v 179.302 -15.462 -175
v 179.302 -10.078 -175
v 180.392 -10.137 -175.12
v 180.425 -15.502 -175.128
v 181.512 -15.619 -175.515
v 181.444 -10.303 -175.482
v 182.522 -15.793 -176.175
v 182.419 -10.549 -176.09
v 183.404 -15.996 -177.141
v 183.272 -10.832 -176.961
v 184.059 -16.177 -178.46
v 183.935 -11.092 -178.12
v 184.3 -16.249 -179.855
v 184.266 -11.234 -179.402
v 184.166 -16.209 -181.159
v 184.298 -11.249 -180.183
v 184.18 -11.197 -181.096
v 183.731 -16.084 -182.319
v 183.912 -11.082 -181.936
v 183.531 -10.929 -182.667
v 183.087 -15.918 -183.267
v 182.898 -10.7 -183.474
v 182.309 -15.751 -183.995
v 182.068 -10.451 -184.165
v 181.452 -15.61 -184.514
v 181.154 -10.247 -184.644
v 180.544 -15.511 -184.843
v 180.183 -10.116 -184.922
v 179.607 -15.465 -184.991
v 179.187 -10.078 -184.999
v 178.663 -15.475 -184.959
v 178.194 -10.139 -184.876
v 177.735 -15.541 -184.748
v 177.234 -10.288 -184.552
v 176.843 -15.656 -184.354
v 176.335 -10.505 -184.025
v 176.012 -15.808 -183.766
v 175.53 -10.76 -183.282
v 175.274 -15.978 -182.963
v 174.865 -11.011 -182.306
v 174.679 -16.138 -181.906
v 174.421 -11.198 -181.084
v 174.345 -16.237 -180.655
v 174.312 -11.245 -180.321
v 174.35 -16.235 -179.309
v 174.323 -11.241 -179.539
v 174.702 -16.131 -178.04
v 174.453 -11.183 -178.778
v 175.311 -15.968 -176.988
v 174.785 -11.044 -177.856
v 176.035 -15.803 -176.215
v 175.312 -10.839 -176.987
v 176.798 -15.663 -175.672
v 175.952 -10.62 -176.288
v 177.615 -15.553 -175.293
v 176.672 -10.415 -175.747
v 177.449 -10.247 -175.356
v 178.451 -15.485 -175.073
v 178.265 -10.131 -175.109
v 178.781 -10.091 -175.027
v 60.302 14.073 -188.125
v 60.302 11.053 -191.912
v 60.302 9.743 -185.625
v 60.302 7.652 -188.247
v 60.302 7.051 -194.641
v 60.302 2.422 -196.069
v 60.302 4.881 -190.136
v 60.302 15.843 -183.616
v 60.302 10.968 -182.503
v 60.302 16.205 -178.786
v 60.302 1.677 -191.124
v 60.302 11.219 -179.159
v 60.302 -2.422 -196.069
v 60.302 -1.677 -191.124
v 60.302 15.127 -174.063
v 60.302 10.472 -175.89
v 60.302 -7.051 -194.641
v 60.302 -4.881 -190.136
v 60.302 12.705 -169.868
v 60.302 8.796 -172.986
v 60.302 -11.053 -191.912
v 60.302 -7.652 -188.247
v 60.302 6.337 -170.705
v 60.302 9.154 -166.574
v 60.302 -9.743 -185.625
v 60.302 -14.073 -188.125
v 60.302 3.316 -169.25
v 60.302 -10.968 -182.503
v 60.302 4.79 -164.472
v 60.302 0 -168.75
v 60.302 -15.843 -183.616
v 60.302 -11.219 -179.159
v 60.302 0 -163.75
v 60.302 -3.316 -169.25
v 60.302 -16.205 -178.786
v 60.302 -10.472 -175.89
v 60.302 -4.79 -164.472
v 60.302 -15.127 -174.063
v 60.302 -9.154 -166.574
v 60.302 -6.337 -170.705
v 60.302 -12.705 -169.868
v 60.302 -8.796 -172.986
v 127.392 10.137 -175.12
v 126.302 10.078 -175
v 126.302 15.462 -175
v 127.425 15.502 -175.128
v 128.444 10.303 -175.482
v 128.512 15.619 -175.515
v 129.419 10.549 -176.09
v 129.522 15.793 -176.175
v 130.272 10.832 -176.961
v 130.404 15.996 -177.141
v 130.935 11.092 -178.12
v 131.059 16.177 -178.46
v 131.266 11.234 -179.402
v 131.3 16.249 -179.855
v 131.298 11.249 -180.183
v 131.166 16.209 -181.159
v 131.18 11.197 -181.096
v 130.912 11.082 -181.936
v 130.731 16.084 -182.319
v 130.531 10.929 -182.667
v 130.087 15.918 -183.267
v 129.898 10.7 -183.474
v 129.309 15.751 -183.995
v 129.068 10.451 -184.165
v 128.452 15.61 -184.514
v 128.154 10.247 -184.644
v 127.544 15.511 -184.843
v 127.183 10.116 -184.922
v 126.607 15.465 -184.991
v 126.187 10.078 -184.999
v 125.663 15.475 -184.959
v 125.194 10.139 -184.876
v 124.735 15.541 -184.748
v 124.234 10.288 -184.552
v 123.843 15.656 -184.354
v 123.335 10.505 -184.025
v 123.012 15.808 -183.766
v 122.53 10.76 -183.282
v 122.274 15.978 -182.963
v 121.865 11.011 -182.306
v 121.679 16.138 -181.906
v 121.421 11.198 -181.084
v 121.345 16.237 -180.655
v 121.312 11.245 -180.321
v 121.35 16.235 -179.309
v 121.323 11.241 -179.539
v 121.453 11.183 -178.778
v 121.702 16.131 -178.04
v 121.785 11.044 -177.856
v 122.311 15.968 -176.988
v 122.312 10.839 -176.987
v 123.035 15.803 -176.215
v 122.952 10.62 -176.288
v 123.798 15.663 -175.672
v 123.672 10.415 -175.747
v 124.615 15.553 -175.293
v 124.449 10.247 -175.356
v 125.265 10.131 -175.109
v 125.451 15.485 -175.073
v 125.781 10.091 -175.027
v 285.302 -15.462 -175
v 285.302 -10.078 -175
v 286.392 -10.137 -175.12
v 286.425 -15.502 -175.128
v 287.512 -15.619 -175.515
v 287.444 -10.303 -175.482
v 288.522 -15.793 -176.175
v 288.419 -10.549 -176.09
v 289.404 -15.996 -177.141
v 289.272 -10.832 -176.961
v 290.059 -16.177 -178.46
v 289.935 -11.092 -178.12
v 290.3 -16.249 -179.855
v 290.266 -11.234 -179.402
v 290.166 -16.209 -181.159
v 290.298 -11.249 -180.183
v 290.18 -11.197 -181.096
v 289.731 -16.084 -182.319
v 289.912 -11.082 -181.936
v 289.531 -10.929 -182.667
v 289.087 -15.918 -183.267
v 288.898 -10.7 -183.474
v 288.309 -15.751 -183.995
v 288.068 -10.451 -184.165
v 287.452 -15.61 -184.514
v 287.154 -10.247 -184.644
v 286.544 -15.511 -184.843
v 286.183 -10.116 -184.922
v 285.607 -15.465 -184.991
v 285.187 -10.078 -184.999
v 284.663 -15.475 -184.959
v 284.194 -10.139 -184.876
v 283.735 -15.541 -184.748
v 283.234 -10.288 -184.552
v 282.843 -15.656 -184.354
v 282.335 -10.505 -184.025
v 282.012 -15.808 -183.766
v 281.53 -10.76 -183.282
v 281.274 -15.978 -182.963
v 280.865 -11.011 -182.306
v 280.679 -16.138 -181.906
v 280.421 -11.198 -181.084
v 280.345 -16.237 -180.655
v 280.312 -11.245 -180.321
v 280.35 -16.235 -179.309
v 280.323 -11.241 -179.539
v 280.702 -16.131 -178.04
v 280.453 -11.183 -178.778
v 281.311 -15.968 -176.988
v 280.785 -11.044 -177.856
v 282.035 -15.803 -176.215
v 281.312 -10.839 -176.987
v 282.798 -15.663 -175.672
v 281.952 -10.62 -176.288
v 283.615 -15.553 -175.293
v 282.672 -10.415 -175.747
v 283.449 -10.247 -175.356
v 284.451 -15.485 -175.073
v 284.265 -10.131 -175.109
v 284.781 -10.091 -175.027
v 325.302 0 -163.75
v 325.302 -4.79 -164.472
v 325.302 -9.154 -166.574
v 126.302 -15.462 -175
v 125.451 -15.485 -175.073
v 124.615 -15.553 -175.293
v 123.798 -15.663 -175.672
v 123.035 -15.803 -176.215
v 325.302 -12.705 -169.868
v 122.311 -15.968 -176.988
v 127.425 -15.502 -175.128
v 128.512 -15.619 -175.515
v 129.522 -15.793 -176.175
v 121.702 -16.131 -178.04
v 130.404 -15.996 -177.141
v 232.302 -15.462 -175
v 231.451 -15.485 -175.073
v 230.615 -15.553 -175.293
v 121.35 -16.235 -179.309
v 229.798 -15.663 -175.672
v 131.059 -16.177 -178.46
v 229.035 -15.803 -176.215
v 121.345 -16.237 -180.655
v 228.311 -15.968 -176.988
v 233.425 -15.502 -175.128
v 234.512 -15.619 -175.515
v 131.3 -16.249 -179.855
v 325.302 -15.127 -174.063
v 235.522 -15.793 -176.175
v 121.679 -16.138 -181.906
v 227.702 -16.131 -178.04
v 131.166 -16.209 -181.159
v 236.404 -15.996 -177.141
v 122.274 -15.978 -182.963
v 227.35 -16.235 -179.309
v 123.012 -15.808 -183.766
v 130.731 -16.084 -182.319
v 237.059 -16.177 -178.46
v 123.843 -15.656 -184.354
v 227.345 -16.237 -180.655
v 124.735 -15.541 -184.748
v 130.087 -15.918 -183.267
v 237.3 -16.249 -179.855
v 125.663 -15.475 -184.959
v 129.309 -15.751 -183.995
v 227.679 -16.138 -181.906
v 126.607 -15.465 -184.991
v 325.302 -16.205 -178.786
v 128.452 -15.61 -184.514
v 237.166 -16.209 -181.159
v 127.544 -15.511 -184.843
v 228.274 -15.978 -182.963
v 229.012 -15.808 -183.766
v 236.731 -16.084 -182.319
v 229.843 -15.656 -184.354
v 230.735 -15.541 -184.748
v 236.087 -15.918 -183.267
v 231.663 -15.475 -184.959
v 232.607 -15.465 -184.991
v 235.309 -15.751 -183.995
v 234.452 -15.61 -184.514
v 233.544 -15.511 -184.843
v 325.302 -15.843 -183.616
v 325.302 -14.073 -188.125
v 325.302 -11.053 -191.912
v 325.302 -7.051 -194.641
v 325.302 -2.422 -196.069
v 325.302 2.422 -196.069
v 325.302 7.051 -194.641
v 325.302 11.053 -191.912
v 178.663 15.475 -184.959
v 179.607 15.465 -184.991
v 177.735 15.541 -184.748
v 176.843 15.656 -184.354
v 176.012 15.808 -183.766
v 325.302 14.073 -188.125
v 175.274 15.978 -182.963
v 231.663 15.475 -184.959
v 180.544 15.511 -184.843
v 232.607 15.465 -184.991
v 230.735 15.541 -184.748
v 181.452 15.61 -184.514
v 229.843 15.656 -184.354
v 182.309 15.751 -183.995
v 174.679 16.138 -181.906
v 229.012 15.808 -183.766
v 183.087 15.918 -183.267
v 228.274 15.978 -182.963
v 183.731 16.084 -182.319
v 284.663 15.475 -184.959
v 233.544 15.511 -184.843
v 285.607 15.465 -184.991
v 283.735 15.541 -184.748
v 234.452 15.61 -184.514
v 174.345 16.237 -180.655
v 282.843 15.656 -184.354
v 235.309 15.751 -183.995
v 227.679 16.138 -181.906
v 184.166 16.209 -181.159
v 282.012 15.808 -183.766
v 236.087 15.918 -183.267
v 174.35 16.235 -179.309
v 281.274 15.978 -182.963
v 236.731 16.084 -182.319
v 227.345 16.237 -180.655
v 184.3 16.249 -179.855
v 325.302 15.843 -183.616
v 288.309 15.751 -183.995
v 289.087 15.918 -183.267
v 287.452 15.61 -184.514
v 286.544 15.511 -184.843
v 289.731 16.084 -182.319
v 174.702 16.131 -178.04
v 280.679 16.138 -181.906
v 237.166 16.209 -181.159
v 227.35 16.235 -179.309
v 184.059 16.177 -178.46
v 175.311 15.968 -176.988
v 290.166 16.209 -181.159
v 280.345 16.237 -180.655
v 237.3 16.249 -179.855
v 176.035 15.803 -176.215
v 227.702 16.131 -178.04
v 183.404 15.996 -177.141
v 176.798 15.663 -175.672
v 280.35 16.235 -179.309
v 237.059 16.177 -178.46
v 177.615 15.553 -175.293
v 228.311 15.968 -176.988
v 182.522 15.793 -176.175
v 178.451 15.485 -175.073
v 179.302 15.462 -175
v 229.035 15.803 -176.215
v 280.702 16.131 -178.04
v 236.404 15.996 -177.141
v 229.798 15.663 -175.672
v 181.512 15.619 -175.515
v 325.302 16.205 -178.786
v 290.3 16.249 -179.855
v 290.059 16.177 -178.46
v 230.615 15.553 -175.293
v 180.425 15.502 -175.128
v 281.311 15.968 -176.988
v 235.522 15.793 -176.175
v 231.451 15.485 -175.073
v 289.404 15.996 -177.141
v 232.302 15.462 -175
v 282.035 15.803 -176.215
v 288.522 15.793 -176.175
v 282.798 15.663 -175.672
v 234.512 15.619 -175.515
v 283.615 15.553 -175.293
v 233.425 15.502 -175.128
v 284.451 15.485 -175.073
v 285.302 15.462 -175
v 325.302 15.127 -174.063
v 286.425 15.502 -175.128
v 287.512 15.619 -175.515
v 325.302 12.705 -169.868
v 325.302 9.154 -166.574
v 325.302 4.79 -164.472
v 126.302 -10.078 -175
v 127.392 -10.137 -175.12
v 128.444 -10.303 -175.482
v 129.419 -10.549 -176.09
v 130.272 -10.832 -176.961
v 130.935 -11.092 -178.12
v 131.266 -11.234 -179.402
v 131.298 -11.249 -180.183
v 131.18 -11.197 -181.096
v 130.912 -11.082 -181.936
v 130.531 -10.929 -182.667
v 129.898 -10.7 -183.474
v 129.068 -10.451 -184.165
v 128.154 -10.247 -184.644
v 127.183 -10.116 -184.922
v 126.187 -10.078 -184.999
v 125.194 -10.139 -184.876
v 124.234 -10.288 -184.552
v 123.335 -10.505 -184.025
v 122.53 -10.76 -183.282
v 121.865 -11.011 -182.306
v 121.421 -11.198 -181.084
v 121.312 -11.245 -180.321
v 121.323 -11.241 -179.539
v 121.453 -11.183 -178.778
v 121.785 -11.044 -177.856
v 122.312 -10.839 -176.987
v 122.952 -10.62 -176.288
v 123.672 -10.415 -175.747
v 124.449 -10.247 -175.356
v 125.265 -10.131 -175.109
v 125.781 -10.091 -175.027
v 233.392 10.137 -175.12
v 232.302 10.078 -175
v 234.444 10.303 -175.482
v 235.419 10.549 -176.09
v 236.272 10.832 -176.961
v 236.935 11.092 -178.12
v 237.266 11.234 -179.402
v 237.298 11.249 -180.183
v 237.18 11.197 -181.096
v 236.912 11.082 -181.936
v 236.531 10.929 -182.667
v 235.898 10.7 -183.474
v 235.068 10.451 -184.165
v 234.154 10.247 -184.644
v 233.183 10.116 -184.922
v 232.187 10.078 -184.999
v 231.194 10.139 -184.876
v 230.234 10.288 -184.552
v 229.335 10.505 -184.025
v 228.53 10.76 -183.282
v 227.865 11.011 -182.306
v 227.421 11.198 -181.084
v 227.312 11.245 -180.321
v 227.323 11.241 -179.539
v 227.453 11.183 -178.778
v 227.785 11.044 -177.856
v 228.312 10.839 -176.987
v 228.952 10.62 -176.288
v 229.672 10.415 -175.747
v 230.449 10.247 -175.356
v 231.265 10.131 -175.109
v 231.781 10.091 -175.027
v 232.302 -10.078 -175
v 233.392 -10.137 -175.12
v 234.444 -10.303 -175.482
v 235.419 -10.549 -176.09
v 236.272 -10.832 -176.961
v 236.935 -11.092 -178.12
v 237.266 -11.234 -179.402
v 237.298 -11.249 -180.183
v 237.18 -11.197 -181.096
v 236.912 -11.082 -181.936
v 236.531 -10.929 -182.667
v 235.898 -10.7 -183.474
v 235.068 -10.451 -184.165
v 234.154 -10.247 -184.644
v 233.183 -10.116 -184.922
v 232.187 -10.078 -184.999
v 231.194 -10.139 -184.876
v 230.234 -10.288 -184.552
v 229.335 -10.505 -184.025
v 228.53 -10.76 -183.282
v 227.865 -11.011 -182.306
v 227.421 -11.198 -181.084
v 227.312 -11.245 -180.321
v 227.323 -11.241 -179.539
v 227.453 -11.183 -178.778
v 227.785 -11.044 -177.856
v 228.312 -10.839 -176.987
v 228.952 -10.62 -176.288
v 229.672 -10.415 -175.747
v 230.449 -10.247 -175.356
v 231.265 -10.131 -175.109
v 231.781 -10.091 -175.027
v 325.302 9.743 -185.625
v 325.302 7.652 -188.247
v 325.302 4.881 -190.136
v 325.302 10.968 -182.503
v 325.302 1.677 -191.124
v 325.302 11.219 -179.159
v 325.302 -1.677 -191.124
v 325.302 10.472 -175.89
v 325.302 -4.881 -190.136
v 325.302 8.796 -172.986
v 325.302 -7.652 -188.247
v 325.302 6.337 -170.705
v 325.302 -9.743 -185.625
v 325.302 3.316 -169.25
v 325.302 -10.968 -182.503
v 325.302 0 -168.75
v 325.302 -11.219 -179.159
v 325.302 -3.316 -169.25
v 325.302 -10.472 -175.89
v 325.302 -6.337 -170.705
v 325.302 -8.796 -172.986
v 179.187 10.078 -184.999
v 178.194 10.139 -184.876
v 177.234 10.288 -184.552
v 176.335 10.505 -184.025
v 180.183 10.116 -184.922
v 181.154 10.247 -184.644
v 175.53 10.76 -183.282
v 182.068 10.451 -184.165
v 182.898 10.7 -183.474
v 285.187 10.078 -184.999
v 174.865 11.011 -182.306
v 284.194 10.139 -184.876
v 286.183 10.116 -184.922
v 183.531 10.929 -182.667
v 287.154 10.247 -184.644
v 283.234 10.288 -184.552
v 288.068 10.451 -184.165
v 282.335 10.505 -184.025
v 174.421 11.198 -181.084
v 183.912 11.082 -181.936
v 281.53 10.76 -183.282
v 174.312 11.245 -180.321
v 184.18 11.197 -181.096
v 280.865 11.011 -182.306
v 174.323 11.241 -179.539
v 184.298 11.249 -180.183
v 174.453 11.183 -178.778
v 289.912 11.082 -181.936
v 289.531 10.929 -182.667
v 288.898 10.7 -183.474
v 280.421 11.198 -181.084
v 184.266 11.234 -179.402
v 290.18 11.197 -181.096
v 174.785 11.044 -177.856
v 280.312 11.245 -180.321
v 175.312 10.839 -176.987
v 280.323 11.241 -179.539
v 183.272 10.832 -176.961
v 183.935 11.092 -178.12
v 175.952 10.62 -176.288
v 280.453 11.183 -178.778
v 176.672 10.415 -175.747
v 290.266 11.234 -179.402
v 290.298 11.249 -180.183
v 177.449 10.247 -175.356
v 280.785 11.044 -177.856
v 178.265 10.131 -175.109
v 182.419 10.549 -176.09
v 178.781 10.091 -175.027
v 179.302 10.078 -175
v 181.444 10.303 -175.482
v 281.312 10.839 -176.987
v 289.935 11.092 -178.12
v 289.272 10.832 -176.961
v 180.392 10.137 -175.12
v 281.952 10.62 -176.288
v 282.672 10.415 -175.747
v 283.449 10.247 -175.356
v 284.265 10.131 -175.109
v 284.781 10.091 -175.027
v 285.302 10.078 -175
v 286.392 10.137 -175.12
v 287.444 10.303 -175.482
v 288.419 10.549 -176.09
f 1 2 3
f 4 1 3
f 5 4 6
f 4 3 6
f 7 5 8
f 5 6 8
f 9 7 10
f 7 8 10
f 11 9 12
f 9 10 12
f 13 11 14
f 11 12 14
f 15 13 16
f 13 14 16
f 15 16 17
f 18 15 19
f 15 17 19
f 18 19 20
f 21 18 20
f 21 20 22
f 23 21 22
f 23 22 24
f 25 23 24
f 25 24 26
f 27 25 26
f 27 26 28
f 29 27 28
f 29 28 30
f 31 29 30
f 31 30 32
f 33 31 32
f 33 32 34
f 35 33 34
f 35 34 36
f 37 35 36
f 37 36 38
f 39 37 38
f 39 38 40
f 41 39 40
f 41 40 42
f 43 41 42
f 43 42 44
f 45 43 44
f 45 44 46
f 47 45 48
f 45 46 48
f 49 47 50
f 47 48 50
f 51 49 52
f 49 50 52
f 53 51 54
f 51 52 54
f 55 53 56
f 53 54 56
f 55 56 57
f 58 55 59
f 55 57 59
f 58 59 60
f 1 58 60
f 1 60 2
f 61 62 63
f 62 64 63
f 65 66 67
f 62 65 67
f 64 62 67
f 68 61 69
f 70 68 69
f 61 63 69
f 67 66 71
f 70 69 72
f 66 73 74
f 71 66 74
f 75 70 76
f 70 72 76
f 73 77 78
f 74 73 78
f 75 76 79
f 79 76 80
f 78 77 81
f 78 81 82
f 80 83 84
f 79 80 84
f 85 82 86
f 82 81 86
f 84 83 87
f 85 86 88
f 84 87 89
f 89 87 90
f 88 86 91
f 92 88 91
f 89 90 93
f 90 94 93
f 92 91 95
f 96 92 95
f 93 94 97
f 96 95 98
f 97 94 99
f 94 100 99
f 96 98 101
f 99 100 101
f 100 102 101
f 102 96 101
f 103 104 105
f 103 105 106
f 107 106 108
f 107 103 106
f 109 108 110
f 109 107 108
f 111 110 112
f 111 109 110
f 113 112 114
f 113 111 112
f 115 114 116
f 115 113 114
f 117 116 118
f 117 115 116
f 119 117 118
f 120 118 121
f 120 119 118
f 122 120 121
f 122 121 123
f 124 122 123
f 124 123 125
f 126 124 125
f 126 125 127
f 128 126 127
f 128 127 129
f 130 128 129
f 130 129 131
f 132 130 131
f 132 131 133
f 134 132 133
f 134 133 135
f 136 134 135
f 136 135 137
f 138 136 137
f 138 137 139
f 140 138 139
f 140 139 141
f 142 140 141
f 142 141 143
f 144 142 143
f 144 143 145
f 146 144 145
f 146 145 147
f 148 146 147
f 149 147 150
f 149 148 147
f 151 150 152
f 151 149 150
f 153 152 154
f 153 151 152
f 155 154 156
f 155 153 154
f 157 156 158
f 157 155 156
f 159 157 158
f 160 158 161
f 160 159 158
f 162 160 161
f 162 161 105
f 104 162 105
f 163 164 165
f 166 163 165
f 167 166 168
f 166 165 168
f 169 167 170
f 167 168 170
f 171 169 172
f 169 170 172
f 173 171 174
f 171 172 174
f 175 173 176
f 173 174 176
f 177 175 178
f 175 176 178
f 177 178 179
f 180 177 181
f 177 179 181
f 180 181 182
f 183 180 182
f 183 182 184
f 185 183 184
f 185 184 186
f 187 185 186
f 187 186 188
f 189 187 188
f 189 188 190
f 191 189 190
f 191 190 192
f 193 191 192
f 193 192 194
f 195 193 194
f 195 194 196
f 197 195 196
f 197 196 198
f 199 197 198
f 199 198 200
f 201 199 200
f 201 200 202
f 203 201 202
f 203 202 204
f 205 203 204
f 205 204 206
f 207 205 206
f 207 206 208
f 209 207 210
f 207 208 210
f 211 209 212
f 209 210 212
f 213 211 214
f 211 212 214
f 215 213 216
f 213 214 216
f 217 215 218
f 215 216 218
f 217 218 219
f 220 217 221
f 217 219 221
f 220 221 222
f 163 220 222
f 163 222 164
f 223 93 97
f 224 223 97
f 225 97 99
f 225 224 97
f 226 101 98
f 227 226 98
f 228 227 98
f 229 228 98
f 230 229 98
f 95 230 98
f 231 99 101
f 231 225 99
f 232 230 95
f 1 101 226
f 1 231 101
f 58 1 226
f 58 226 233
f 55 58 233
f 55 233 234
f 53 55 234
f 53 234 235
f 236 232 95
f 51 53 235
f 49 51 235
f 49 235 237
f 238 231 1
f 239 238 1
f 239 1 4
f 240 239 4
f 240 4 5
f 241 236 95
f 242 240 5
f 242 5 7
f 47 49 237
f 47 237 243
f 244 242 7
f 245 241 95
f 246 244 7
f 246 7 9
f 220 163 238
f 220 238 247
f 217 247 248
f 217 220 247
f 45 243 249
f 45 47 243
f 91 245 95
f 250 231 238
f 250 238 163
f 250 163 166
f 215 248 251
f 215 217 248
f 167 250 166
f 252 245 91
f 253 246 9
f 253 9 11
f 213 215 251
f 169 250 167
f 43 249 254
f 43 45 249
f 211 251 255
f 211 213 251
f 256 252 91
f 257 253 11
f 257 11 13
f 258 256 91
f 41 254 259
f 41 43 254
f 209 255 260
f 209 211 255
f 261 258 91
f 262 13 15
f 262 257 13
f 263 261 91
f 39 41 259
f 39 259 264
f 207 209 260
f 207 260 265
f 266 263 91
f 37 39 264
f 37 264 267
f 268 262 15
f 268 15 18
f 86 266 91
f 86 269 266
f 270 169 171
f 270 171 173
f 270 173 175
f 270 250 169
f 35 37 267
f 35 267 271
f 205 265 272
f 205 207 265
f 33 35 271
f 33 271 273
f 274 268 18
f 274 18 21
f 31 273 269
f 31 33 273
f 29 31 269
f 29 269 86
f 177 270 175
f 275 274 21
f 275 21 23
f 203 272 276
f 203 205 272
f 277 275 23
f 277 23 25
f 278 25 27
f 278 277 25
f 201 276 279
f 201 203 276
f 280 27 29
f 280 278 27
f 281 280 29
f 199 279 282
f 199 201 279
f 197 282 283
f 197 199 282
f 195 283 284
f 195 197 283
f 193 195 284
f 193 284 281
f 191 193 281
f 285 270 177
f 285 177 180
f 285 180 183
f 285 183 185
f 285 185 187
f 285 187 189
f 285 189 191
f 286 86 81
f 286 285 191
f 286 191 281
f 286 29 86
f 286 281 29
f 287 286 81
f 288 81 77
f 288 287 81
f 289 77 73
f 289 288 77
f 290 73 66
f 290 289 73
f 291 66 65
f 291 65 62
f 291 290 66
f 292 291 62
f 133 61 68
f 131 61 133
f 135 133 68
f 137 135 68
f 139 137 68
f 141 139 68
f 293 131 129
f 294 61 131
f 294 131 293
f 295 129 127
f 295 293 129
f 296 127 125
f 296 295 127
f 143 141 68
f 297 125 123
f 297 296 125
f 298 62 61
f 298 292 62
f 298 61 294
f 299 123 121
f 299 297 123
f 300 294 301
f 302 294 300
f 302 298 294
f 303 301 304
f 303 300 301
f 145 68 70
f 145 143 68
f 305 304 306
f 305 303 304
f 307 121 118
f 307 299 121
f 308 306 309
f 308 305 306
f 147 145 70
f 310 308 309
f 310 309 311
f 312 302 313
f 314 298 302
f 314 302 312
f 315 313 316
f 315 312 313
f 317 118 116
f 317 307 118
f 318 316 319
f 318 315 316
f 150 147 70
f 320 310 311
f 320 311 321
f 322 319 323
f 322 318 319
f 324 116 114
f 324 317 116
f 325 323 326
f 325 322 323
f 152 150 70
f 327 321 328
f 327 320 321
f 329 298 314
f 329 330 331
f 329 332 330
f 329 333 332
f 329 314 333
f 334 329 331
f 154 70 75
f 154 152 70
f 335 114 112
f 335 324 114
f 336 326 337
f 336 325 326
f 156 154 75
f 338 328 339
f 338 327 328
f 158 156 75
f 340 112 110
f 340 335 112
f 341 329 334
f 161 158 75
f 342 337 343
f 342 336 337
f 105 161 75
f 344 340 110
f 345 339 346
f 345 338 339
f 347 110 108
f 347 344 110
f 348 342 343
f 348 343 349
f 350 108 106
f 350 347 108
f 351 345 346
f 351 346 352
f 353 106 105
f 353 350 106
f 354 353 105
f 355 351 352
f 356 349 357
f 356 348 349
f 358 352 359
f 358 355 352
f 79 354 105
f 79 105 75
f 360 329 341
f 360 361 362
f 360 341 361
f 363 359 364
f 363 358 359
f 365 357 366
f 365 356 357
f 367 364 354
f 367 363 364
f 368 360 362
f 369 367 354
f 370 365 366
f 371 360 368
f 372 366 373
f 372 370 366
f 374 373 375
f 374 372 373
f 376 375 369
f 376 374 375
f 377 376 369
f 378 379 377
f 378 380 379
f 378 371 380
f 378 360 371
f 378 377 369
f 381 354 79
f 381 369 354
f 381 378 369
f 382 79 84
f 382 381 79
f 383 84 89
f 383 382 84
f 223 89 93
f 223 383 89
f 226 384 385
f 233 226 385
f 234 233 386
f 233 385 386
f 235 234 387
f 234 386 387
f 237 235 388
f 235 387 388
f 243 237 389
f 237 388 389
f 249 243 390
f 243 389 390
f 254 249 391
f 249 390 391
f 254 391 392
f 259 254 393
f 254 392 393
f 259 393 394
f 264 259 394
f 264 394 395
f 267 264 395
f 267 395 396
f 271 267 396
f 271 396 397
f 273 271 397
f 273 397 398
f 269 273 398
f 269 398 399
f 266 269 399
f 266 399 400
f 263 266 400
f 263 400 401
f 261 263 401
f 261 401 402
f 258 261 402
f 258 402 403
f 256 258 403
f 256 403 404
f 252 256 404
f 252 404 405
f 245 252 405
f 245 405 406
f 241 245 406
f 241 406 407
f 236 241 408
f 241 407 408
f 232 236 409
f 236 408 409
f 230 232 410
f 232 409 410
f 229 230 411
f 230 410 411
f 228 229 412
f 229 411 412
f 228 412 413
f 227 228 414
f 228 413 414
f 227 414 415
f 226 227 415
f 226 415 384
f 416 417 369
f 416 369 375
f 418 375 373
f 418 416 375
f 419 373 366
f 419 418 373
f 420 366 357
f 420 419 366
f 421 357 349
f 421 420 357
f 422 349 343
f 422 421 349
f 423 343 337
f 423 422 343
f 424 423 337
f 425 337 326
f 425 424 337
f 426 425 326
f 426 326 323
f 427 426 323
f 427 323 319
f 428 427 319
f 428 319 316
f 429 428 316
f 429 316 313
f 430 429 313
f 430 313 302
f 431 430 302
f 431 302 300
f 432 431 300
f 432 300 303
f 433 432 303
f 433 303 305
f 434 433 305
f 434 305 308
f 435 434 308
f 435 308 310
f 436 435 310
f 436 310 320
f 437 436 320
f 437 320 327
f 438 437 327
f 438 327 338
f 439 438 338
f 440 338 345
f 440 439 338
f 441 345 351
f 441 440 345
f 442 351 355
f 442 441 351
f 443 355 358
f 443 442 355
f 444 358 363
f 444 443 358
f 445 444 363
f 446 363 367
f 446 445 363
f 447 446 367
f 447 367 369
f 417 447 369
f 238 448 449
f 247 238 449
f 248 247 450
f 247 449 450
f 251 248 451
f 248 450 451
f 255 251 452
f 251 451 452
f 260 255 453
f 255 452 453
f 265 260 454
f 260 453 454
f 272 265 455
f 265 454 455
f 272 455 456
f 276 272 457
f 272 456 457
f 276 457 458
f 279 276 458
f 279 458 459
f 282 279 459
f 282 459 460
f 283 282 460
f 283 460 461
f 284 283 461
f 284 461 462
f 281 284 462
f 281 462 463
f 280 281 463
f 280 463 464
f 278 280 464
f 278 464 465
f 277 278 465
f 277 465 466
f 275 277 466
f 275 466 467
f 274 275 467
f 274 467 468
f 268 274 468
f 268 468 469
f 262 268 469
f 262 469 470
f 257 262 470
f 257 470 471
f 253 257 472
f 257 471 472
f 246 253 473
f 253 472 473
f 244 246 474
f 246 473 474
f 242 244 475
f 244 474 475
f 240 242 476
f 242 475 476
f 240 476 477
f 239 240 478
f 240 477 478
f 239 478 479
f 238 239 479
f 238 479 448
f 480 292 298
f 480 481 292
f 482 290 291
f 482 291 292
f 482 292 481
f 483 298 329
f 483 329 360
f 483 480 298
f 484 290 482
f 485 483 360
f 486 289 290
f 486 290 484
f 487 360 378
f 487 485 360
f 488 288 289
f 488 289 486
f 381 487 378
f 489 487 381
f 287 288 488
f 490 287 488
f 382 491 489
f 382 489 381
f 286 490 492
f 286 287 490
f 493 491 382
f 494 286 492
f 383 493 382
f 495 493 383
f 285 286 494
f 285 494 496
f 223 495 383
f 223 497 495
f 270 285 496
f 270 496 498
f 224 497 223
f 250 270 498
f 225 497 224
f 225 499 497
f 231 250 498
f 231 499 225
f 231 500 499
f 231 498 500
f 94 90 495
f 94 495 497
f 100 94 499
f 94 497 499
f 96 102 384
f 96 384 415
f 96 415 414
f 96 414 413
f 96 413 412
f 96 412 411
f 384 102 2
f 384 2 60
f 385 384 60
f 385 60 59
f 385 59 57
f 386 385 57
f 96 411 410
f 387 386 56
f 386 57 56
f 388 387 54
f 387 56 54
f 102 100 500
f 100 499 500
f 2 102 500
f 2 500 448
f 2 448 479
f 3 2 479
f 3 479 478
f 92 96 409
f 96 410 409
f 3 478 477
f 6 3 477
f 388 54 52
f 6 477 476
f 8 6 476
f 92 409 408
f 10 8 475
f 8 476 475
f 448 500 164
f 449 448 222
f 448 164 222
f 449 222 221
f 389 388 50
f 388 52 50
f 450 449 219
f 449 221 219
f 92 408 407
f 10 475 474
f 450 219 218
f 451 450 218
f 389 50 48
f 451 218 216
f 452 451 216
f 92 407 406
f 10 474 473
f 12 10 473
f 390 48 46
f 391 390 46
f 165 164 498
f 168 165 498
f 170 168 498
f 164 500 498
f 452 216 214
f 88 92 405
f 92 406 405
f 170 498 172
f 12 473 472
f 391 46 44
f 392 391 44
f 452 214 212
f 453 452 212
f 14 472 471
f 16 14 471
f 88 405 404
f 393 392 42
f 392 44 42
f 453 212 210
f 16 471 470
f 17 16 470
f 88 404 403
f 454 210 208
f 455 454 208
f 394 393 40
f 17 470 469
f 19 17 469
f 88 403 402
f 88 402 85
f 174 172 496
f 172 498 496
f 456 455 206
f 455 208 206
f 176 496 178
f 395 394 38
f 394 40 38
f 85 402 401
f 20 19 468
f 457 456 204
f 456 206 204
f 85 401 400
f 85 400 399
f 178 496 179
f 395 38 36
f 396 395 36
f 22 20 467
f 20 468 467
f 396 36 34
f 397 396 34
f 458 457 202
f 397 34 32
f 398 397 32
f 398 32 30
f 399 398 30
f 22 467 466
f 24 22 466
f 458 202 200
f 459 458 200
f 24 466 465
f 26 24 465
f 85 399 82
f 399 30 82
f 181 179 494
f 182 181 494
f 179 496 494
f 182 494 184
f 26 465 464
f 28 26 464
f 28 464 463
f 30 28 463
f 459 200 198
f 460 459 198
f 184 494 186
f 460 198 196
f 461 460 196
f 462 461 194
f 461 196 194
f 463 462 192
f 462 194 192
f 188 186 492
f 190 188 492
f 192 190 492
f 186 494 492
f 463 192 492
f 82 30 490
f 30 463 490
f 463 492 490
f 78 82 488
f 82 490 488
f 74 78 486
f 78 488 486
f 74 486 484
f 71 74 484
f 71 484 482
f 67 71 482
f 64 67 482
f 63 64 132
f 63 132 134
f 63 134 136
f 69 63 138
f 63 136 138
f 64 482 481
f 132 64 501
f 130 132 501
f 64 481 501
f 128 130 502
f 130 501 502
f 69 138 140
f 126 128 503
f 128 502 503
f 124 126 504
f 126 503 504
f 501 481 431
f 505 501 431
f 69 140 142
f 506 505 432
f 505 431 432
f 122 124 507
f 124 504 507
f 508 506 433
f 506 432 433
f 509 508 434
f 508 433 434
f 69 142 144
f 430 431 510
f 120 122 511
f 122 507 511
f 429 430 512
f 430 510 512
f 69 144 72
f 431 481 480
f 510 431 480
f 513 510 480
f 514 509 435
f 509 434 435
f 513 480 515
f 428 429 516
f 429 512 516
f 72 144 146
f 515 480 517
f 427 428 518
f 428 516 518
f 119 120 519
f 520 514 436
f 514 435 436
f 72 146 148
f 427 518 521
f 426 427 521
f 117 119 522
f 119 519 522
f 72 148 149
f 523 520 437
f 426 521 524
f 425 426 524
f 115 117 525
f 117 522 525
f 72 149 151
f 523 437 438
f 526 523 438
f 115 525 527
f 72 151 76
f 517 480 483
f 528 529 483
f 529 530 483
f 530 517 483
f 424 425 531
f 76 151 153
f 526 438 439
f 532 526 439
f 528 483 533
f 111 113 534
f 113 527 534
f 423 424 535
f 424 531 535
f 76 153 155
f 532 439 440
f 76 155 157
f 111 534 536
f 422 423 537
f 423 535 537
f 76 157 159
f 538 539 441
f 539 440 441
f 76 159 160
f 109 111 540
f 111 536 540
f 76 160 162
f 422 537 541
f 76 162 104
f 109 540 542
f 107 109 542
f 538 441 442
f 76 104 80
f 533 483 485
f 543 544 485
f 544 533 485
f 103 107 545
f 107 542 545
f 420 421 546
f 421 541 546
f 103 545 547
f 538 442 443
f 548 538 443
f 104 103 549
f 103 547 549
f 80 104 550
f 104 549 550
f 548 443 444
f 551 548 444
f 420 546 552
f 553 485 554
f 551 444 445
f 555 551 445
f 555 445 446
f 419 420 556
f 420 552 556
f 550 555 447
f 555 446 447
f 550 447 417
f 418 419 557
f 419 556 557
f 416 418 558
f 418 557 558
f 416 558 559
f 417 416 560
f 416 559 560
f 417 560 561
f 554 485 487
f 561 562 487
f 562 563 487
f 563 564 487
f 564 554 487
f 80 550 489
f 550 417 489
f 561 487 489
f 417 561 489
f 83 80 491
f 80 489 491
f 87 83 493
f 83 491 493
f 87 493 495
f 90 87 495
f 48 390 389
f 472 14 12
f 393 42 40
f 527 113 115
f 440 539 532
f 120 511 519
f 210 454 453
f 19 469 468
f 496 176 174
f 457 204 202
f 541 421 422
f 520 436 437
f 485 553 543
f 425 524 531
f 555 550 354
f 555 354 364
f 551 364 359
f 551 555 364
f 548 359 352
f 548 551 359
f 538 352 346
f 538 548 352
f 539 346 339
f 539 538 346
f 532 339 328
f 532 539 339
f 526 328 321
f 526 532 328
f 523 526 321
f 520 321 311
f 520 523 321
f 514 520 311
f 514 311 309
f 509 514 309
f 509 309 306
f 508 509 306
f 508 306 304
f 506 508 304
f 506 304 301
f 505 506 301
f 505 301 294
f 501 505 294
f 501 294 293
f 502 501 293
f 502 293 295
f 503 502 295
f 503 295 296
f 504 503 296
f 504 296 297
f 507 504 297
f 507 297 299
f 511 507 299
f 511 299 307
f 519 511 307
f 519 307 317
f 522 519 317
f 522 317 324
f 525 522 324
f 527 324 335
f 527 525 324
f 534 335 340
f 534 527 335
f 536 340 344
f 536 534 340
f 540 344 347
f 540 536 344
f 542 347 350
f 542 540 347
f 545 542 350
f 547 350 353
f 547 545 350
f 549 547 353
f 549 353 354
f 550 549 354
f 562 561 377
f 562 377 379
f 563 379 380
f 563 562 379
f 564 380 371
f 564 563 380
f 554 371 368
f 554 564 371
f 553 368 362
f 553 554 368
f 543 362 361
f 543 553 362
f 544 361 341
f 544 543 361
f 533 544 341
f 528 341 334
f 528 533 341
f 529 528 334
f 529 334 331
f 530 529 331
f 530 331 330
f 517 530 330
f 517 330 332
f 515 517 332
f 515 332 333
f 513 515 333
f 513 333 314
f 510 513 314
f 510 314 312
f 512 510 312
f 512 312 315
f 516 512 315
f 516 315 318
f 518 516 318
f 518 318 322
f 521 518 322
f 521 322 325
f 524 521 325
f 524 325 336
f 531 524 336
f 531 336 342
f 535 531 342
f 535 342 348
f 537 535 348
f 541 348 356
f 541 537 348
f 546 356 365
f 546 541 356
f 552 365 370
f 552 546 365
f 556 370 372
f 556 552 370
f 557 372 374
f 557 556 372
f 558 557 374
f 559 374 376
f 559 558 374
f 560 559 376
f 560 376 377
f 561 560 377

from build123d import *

# Parameters (mm, degrees)
SWEEP_THIN1_PROFILE_R   = 16.25
SWEEP_THIN1_PROFILE_R_2 = 11.25
SKETCH3_R               = 5
CUT_EXTRUDE1_DEPTH      = 381.262213736
CUT_EXTRUDE1_DEPTH_BACK = 381.262213736


with BuildPart() as part:
    # Sweep-Thin1: sweep along a path in Sketch2
    with BuildLine(Plane(origin=(0, 0, 0), x_dir=(1, 0, 0), z_dir=(0, 1, 0))) as sweep_thin1_path:
        Line((60.301746377, 180), (325.301746377, 180))
    # Sweep-Thin1 profile (on start of the path) → Sweep-Thin1 (sweep)
    with BuildSketch(Plane(origin=(60.301746377, 0, -180), x_dir=(0, 0, 1), z_dir=(1, 0, 0))):
        Circle(SWEEP_THIN1_PROFILE_R)
        Circle(SWEEP_THIN1_PROFILE_R_2, mode=Mode.SUBTRACT)
    sweep(path=sweep_thin1_path.line)

    # Sketch3 → Cut-Extrude1 (cut, two sides)
    with BuildSketch(Plane(origin=(0, 0, 0), x_dir=(1, 0, 0), z_dir=(0, 1, 0))) as cut_extrude1_sk:
        with Locations(Location((126.301746377, 180, 0), (0, 0, 270))):
            Circle(SKETCH3_R)
        with Locations(Location((179.301746377, 180, 0), (0, 0, 270))):
            Circle(SKETCH3_R)
        with Locations(Location((232.301746377, 180, 0), (0, 0, 270))):
            Circle(SKETCH3_R)
        with Locations(Location((285.301746377, 180, 0), (0, 0, 270))):
            Circle(SKETCH3_R)
    extrude(amount=CUT_EXTRUDE1_DEPTH, mode=Mode.SUBTRACT)
    extrude(cut_extrude1_sk.sketch, amount=-CUT_EXTRUDE1_DEPTH_BACK, mode=Mode.SUBTRACT)


solid = part.part
